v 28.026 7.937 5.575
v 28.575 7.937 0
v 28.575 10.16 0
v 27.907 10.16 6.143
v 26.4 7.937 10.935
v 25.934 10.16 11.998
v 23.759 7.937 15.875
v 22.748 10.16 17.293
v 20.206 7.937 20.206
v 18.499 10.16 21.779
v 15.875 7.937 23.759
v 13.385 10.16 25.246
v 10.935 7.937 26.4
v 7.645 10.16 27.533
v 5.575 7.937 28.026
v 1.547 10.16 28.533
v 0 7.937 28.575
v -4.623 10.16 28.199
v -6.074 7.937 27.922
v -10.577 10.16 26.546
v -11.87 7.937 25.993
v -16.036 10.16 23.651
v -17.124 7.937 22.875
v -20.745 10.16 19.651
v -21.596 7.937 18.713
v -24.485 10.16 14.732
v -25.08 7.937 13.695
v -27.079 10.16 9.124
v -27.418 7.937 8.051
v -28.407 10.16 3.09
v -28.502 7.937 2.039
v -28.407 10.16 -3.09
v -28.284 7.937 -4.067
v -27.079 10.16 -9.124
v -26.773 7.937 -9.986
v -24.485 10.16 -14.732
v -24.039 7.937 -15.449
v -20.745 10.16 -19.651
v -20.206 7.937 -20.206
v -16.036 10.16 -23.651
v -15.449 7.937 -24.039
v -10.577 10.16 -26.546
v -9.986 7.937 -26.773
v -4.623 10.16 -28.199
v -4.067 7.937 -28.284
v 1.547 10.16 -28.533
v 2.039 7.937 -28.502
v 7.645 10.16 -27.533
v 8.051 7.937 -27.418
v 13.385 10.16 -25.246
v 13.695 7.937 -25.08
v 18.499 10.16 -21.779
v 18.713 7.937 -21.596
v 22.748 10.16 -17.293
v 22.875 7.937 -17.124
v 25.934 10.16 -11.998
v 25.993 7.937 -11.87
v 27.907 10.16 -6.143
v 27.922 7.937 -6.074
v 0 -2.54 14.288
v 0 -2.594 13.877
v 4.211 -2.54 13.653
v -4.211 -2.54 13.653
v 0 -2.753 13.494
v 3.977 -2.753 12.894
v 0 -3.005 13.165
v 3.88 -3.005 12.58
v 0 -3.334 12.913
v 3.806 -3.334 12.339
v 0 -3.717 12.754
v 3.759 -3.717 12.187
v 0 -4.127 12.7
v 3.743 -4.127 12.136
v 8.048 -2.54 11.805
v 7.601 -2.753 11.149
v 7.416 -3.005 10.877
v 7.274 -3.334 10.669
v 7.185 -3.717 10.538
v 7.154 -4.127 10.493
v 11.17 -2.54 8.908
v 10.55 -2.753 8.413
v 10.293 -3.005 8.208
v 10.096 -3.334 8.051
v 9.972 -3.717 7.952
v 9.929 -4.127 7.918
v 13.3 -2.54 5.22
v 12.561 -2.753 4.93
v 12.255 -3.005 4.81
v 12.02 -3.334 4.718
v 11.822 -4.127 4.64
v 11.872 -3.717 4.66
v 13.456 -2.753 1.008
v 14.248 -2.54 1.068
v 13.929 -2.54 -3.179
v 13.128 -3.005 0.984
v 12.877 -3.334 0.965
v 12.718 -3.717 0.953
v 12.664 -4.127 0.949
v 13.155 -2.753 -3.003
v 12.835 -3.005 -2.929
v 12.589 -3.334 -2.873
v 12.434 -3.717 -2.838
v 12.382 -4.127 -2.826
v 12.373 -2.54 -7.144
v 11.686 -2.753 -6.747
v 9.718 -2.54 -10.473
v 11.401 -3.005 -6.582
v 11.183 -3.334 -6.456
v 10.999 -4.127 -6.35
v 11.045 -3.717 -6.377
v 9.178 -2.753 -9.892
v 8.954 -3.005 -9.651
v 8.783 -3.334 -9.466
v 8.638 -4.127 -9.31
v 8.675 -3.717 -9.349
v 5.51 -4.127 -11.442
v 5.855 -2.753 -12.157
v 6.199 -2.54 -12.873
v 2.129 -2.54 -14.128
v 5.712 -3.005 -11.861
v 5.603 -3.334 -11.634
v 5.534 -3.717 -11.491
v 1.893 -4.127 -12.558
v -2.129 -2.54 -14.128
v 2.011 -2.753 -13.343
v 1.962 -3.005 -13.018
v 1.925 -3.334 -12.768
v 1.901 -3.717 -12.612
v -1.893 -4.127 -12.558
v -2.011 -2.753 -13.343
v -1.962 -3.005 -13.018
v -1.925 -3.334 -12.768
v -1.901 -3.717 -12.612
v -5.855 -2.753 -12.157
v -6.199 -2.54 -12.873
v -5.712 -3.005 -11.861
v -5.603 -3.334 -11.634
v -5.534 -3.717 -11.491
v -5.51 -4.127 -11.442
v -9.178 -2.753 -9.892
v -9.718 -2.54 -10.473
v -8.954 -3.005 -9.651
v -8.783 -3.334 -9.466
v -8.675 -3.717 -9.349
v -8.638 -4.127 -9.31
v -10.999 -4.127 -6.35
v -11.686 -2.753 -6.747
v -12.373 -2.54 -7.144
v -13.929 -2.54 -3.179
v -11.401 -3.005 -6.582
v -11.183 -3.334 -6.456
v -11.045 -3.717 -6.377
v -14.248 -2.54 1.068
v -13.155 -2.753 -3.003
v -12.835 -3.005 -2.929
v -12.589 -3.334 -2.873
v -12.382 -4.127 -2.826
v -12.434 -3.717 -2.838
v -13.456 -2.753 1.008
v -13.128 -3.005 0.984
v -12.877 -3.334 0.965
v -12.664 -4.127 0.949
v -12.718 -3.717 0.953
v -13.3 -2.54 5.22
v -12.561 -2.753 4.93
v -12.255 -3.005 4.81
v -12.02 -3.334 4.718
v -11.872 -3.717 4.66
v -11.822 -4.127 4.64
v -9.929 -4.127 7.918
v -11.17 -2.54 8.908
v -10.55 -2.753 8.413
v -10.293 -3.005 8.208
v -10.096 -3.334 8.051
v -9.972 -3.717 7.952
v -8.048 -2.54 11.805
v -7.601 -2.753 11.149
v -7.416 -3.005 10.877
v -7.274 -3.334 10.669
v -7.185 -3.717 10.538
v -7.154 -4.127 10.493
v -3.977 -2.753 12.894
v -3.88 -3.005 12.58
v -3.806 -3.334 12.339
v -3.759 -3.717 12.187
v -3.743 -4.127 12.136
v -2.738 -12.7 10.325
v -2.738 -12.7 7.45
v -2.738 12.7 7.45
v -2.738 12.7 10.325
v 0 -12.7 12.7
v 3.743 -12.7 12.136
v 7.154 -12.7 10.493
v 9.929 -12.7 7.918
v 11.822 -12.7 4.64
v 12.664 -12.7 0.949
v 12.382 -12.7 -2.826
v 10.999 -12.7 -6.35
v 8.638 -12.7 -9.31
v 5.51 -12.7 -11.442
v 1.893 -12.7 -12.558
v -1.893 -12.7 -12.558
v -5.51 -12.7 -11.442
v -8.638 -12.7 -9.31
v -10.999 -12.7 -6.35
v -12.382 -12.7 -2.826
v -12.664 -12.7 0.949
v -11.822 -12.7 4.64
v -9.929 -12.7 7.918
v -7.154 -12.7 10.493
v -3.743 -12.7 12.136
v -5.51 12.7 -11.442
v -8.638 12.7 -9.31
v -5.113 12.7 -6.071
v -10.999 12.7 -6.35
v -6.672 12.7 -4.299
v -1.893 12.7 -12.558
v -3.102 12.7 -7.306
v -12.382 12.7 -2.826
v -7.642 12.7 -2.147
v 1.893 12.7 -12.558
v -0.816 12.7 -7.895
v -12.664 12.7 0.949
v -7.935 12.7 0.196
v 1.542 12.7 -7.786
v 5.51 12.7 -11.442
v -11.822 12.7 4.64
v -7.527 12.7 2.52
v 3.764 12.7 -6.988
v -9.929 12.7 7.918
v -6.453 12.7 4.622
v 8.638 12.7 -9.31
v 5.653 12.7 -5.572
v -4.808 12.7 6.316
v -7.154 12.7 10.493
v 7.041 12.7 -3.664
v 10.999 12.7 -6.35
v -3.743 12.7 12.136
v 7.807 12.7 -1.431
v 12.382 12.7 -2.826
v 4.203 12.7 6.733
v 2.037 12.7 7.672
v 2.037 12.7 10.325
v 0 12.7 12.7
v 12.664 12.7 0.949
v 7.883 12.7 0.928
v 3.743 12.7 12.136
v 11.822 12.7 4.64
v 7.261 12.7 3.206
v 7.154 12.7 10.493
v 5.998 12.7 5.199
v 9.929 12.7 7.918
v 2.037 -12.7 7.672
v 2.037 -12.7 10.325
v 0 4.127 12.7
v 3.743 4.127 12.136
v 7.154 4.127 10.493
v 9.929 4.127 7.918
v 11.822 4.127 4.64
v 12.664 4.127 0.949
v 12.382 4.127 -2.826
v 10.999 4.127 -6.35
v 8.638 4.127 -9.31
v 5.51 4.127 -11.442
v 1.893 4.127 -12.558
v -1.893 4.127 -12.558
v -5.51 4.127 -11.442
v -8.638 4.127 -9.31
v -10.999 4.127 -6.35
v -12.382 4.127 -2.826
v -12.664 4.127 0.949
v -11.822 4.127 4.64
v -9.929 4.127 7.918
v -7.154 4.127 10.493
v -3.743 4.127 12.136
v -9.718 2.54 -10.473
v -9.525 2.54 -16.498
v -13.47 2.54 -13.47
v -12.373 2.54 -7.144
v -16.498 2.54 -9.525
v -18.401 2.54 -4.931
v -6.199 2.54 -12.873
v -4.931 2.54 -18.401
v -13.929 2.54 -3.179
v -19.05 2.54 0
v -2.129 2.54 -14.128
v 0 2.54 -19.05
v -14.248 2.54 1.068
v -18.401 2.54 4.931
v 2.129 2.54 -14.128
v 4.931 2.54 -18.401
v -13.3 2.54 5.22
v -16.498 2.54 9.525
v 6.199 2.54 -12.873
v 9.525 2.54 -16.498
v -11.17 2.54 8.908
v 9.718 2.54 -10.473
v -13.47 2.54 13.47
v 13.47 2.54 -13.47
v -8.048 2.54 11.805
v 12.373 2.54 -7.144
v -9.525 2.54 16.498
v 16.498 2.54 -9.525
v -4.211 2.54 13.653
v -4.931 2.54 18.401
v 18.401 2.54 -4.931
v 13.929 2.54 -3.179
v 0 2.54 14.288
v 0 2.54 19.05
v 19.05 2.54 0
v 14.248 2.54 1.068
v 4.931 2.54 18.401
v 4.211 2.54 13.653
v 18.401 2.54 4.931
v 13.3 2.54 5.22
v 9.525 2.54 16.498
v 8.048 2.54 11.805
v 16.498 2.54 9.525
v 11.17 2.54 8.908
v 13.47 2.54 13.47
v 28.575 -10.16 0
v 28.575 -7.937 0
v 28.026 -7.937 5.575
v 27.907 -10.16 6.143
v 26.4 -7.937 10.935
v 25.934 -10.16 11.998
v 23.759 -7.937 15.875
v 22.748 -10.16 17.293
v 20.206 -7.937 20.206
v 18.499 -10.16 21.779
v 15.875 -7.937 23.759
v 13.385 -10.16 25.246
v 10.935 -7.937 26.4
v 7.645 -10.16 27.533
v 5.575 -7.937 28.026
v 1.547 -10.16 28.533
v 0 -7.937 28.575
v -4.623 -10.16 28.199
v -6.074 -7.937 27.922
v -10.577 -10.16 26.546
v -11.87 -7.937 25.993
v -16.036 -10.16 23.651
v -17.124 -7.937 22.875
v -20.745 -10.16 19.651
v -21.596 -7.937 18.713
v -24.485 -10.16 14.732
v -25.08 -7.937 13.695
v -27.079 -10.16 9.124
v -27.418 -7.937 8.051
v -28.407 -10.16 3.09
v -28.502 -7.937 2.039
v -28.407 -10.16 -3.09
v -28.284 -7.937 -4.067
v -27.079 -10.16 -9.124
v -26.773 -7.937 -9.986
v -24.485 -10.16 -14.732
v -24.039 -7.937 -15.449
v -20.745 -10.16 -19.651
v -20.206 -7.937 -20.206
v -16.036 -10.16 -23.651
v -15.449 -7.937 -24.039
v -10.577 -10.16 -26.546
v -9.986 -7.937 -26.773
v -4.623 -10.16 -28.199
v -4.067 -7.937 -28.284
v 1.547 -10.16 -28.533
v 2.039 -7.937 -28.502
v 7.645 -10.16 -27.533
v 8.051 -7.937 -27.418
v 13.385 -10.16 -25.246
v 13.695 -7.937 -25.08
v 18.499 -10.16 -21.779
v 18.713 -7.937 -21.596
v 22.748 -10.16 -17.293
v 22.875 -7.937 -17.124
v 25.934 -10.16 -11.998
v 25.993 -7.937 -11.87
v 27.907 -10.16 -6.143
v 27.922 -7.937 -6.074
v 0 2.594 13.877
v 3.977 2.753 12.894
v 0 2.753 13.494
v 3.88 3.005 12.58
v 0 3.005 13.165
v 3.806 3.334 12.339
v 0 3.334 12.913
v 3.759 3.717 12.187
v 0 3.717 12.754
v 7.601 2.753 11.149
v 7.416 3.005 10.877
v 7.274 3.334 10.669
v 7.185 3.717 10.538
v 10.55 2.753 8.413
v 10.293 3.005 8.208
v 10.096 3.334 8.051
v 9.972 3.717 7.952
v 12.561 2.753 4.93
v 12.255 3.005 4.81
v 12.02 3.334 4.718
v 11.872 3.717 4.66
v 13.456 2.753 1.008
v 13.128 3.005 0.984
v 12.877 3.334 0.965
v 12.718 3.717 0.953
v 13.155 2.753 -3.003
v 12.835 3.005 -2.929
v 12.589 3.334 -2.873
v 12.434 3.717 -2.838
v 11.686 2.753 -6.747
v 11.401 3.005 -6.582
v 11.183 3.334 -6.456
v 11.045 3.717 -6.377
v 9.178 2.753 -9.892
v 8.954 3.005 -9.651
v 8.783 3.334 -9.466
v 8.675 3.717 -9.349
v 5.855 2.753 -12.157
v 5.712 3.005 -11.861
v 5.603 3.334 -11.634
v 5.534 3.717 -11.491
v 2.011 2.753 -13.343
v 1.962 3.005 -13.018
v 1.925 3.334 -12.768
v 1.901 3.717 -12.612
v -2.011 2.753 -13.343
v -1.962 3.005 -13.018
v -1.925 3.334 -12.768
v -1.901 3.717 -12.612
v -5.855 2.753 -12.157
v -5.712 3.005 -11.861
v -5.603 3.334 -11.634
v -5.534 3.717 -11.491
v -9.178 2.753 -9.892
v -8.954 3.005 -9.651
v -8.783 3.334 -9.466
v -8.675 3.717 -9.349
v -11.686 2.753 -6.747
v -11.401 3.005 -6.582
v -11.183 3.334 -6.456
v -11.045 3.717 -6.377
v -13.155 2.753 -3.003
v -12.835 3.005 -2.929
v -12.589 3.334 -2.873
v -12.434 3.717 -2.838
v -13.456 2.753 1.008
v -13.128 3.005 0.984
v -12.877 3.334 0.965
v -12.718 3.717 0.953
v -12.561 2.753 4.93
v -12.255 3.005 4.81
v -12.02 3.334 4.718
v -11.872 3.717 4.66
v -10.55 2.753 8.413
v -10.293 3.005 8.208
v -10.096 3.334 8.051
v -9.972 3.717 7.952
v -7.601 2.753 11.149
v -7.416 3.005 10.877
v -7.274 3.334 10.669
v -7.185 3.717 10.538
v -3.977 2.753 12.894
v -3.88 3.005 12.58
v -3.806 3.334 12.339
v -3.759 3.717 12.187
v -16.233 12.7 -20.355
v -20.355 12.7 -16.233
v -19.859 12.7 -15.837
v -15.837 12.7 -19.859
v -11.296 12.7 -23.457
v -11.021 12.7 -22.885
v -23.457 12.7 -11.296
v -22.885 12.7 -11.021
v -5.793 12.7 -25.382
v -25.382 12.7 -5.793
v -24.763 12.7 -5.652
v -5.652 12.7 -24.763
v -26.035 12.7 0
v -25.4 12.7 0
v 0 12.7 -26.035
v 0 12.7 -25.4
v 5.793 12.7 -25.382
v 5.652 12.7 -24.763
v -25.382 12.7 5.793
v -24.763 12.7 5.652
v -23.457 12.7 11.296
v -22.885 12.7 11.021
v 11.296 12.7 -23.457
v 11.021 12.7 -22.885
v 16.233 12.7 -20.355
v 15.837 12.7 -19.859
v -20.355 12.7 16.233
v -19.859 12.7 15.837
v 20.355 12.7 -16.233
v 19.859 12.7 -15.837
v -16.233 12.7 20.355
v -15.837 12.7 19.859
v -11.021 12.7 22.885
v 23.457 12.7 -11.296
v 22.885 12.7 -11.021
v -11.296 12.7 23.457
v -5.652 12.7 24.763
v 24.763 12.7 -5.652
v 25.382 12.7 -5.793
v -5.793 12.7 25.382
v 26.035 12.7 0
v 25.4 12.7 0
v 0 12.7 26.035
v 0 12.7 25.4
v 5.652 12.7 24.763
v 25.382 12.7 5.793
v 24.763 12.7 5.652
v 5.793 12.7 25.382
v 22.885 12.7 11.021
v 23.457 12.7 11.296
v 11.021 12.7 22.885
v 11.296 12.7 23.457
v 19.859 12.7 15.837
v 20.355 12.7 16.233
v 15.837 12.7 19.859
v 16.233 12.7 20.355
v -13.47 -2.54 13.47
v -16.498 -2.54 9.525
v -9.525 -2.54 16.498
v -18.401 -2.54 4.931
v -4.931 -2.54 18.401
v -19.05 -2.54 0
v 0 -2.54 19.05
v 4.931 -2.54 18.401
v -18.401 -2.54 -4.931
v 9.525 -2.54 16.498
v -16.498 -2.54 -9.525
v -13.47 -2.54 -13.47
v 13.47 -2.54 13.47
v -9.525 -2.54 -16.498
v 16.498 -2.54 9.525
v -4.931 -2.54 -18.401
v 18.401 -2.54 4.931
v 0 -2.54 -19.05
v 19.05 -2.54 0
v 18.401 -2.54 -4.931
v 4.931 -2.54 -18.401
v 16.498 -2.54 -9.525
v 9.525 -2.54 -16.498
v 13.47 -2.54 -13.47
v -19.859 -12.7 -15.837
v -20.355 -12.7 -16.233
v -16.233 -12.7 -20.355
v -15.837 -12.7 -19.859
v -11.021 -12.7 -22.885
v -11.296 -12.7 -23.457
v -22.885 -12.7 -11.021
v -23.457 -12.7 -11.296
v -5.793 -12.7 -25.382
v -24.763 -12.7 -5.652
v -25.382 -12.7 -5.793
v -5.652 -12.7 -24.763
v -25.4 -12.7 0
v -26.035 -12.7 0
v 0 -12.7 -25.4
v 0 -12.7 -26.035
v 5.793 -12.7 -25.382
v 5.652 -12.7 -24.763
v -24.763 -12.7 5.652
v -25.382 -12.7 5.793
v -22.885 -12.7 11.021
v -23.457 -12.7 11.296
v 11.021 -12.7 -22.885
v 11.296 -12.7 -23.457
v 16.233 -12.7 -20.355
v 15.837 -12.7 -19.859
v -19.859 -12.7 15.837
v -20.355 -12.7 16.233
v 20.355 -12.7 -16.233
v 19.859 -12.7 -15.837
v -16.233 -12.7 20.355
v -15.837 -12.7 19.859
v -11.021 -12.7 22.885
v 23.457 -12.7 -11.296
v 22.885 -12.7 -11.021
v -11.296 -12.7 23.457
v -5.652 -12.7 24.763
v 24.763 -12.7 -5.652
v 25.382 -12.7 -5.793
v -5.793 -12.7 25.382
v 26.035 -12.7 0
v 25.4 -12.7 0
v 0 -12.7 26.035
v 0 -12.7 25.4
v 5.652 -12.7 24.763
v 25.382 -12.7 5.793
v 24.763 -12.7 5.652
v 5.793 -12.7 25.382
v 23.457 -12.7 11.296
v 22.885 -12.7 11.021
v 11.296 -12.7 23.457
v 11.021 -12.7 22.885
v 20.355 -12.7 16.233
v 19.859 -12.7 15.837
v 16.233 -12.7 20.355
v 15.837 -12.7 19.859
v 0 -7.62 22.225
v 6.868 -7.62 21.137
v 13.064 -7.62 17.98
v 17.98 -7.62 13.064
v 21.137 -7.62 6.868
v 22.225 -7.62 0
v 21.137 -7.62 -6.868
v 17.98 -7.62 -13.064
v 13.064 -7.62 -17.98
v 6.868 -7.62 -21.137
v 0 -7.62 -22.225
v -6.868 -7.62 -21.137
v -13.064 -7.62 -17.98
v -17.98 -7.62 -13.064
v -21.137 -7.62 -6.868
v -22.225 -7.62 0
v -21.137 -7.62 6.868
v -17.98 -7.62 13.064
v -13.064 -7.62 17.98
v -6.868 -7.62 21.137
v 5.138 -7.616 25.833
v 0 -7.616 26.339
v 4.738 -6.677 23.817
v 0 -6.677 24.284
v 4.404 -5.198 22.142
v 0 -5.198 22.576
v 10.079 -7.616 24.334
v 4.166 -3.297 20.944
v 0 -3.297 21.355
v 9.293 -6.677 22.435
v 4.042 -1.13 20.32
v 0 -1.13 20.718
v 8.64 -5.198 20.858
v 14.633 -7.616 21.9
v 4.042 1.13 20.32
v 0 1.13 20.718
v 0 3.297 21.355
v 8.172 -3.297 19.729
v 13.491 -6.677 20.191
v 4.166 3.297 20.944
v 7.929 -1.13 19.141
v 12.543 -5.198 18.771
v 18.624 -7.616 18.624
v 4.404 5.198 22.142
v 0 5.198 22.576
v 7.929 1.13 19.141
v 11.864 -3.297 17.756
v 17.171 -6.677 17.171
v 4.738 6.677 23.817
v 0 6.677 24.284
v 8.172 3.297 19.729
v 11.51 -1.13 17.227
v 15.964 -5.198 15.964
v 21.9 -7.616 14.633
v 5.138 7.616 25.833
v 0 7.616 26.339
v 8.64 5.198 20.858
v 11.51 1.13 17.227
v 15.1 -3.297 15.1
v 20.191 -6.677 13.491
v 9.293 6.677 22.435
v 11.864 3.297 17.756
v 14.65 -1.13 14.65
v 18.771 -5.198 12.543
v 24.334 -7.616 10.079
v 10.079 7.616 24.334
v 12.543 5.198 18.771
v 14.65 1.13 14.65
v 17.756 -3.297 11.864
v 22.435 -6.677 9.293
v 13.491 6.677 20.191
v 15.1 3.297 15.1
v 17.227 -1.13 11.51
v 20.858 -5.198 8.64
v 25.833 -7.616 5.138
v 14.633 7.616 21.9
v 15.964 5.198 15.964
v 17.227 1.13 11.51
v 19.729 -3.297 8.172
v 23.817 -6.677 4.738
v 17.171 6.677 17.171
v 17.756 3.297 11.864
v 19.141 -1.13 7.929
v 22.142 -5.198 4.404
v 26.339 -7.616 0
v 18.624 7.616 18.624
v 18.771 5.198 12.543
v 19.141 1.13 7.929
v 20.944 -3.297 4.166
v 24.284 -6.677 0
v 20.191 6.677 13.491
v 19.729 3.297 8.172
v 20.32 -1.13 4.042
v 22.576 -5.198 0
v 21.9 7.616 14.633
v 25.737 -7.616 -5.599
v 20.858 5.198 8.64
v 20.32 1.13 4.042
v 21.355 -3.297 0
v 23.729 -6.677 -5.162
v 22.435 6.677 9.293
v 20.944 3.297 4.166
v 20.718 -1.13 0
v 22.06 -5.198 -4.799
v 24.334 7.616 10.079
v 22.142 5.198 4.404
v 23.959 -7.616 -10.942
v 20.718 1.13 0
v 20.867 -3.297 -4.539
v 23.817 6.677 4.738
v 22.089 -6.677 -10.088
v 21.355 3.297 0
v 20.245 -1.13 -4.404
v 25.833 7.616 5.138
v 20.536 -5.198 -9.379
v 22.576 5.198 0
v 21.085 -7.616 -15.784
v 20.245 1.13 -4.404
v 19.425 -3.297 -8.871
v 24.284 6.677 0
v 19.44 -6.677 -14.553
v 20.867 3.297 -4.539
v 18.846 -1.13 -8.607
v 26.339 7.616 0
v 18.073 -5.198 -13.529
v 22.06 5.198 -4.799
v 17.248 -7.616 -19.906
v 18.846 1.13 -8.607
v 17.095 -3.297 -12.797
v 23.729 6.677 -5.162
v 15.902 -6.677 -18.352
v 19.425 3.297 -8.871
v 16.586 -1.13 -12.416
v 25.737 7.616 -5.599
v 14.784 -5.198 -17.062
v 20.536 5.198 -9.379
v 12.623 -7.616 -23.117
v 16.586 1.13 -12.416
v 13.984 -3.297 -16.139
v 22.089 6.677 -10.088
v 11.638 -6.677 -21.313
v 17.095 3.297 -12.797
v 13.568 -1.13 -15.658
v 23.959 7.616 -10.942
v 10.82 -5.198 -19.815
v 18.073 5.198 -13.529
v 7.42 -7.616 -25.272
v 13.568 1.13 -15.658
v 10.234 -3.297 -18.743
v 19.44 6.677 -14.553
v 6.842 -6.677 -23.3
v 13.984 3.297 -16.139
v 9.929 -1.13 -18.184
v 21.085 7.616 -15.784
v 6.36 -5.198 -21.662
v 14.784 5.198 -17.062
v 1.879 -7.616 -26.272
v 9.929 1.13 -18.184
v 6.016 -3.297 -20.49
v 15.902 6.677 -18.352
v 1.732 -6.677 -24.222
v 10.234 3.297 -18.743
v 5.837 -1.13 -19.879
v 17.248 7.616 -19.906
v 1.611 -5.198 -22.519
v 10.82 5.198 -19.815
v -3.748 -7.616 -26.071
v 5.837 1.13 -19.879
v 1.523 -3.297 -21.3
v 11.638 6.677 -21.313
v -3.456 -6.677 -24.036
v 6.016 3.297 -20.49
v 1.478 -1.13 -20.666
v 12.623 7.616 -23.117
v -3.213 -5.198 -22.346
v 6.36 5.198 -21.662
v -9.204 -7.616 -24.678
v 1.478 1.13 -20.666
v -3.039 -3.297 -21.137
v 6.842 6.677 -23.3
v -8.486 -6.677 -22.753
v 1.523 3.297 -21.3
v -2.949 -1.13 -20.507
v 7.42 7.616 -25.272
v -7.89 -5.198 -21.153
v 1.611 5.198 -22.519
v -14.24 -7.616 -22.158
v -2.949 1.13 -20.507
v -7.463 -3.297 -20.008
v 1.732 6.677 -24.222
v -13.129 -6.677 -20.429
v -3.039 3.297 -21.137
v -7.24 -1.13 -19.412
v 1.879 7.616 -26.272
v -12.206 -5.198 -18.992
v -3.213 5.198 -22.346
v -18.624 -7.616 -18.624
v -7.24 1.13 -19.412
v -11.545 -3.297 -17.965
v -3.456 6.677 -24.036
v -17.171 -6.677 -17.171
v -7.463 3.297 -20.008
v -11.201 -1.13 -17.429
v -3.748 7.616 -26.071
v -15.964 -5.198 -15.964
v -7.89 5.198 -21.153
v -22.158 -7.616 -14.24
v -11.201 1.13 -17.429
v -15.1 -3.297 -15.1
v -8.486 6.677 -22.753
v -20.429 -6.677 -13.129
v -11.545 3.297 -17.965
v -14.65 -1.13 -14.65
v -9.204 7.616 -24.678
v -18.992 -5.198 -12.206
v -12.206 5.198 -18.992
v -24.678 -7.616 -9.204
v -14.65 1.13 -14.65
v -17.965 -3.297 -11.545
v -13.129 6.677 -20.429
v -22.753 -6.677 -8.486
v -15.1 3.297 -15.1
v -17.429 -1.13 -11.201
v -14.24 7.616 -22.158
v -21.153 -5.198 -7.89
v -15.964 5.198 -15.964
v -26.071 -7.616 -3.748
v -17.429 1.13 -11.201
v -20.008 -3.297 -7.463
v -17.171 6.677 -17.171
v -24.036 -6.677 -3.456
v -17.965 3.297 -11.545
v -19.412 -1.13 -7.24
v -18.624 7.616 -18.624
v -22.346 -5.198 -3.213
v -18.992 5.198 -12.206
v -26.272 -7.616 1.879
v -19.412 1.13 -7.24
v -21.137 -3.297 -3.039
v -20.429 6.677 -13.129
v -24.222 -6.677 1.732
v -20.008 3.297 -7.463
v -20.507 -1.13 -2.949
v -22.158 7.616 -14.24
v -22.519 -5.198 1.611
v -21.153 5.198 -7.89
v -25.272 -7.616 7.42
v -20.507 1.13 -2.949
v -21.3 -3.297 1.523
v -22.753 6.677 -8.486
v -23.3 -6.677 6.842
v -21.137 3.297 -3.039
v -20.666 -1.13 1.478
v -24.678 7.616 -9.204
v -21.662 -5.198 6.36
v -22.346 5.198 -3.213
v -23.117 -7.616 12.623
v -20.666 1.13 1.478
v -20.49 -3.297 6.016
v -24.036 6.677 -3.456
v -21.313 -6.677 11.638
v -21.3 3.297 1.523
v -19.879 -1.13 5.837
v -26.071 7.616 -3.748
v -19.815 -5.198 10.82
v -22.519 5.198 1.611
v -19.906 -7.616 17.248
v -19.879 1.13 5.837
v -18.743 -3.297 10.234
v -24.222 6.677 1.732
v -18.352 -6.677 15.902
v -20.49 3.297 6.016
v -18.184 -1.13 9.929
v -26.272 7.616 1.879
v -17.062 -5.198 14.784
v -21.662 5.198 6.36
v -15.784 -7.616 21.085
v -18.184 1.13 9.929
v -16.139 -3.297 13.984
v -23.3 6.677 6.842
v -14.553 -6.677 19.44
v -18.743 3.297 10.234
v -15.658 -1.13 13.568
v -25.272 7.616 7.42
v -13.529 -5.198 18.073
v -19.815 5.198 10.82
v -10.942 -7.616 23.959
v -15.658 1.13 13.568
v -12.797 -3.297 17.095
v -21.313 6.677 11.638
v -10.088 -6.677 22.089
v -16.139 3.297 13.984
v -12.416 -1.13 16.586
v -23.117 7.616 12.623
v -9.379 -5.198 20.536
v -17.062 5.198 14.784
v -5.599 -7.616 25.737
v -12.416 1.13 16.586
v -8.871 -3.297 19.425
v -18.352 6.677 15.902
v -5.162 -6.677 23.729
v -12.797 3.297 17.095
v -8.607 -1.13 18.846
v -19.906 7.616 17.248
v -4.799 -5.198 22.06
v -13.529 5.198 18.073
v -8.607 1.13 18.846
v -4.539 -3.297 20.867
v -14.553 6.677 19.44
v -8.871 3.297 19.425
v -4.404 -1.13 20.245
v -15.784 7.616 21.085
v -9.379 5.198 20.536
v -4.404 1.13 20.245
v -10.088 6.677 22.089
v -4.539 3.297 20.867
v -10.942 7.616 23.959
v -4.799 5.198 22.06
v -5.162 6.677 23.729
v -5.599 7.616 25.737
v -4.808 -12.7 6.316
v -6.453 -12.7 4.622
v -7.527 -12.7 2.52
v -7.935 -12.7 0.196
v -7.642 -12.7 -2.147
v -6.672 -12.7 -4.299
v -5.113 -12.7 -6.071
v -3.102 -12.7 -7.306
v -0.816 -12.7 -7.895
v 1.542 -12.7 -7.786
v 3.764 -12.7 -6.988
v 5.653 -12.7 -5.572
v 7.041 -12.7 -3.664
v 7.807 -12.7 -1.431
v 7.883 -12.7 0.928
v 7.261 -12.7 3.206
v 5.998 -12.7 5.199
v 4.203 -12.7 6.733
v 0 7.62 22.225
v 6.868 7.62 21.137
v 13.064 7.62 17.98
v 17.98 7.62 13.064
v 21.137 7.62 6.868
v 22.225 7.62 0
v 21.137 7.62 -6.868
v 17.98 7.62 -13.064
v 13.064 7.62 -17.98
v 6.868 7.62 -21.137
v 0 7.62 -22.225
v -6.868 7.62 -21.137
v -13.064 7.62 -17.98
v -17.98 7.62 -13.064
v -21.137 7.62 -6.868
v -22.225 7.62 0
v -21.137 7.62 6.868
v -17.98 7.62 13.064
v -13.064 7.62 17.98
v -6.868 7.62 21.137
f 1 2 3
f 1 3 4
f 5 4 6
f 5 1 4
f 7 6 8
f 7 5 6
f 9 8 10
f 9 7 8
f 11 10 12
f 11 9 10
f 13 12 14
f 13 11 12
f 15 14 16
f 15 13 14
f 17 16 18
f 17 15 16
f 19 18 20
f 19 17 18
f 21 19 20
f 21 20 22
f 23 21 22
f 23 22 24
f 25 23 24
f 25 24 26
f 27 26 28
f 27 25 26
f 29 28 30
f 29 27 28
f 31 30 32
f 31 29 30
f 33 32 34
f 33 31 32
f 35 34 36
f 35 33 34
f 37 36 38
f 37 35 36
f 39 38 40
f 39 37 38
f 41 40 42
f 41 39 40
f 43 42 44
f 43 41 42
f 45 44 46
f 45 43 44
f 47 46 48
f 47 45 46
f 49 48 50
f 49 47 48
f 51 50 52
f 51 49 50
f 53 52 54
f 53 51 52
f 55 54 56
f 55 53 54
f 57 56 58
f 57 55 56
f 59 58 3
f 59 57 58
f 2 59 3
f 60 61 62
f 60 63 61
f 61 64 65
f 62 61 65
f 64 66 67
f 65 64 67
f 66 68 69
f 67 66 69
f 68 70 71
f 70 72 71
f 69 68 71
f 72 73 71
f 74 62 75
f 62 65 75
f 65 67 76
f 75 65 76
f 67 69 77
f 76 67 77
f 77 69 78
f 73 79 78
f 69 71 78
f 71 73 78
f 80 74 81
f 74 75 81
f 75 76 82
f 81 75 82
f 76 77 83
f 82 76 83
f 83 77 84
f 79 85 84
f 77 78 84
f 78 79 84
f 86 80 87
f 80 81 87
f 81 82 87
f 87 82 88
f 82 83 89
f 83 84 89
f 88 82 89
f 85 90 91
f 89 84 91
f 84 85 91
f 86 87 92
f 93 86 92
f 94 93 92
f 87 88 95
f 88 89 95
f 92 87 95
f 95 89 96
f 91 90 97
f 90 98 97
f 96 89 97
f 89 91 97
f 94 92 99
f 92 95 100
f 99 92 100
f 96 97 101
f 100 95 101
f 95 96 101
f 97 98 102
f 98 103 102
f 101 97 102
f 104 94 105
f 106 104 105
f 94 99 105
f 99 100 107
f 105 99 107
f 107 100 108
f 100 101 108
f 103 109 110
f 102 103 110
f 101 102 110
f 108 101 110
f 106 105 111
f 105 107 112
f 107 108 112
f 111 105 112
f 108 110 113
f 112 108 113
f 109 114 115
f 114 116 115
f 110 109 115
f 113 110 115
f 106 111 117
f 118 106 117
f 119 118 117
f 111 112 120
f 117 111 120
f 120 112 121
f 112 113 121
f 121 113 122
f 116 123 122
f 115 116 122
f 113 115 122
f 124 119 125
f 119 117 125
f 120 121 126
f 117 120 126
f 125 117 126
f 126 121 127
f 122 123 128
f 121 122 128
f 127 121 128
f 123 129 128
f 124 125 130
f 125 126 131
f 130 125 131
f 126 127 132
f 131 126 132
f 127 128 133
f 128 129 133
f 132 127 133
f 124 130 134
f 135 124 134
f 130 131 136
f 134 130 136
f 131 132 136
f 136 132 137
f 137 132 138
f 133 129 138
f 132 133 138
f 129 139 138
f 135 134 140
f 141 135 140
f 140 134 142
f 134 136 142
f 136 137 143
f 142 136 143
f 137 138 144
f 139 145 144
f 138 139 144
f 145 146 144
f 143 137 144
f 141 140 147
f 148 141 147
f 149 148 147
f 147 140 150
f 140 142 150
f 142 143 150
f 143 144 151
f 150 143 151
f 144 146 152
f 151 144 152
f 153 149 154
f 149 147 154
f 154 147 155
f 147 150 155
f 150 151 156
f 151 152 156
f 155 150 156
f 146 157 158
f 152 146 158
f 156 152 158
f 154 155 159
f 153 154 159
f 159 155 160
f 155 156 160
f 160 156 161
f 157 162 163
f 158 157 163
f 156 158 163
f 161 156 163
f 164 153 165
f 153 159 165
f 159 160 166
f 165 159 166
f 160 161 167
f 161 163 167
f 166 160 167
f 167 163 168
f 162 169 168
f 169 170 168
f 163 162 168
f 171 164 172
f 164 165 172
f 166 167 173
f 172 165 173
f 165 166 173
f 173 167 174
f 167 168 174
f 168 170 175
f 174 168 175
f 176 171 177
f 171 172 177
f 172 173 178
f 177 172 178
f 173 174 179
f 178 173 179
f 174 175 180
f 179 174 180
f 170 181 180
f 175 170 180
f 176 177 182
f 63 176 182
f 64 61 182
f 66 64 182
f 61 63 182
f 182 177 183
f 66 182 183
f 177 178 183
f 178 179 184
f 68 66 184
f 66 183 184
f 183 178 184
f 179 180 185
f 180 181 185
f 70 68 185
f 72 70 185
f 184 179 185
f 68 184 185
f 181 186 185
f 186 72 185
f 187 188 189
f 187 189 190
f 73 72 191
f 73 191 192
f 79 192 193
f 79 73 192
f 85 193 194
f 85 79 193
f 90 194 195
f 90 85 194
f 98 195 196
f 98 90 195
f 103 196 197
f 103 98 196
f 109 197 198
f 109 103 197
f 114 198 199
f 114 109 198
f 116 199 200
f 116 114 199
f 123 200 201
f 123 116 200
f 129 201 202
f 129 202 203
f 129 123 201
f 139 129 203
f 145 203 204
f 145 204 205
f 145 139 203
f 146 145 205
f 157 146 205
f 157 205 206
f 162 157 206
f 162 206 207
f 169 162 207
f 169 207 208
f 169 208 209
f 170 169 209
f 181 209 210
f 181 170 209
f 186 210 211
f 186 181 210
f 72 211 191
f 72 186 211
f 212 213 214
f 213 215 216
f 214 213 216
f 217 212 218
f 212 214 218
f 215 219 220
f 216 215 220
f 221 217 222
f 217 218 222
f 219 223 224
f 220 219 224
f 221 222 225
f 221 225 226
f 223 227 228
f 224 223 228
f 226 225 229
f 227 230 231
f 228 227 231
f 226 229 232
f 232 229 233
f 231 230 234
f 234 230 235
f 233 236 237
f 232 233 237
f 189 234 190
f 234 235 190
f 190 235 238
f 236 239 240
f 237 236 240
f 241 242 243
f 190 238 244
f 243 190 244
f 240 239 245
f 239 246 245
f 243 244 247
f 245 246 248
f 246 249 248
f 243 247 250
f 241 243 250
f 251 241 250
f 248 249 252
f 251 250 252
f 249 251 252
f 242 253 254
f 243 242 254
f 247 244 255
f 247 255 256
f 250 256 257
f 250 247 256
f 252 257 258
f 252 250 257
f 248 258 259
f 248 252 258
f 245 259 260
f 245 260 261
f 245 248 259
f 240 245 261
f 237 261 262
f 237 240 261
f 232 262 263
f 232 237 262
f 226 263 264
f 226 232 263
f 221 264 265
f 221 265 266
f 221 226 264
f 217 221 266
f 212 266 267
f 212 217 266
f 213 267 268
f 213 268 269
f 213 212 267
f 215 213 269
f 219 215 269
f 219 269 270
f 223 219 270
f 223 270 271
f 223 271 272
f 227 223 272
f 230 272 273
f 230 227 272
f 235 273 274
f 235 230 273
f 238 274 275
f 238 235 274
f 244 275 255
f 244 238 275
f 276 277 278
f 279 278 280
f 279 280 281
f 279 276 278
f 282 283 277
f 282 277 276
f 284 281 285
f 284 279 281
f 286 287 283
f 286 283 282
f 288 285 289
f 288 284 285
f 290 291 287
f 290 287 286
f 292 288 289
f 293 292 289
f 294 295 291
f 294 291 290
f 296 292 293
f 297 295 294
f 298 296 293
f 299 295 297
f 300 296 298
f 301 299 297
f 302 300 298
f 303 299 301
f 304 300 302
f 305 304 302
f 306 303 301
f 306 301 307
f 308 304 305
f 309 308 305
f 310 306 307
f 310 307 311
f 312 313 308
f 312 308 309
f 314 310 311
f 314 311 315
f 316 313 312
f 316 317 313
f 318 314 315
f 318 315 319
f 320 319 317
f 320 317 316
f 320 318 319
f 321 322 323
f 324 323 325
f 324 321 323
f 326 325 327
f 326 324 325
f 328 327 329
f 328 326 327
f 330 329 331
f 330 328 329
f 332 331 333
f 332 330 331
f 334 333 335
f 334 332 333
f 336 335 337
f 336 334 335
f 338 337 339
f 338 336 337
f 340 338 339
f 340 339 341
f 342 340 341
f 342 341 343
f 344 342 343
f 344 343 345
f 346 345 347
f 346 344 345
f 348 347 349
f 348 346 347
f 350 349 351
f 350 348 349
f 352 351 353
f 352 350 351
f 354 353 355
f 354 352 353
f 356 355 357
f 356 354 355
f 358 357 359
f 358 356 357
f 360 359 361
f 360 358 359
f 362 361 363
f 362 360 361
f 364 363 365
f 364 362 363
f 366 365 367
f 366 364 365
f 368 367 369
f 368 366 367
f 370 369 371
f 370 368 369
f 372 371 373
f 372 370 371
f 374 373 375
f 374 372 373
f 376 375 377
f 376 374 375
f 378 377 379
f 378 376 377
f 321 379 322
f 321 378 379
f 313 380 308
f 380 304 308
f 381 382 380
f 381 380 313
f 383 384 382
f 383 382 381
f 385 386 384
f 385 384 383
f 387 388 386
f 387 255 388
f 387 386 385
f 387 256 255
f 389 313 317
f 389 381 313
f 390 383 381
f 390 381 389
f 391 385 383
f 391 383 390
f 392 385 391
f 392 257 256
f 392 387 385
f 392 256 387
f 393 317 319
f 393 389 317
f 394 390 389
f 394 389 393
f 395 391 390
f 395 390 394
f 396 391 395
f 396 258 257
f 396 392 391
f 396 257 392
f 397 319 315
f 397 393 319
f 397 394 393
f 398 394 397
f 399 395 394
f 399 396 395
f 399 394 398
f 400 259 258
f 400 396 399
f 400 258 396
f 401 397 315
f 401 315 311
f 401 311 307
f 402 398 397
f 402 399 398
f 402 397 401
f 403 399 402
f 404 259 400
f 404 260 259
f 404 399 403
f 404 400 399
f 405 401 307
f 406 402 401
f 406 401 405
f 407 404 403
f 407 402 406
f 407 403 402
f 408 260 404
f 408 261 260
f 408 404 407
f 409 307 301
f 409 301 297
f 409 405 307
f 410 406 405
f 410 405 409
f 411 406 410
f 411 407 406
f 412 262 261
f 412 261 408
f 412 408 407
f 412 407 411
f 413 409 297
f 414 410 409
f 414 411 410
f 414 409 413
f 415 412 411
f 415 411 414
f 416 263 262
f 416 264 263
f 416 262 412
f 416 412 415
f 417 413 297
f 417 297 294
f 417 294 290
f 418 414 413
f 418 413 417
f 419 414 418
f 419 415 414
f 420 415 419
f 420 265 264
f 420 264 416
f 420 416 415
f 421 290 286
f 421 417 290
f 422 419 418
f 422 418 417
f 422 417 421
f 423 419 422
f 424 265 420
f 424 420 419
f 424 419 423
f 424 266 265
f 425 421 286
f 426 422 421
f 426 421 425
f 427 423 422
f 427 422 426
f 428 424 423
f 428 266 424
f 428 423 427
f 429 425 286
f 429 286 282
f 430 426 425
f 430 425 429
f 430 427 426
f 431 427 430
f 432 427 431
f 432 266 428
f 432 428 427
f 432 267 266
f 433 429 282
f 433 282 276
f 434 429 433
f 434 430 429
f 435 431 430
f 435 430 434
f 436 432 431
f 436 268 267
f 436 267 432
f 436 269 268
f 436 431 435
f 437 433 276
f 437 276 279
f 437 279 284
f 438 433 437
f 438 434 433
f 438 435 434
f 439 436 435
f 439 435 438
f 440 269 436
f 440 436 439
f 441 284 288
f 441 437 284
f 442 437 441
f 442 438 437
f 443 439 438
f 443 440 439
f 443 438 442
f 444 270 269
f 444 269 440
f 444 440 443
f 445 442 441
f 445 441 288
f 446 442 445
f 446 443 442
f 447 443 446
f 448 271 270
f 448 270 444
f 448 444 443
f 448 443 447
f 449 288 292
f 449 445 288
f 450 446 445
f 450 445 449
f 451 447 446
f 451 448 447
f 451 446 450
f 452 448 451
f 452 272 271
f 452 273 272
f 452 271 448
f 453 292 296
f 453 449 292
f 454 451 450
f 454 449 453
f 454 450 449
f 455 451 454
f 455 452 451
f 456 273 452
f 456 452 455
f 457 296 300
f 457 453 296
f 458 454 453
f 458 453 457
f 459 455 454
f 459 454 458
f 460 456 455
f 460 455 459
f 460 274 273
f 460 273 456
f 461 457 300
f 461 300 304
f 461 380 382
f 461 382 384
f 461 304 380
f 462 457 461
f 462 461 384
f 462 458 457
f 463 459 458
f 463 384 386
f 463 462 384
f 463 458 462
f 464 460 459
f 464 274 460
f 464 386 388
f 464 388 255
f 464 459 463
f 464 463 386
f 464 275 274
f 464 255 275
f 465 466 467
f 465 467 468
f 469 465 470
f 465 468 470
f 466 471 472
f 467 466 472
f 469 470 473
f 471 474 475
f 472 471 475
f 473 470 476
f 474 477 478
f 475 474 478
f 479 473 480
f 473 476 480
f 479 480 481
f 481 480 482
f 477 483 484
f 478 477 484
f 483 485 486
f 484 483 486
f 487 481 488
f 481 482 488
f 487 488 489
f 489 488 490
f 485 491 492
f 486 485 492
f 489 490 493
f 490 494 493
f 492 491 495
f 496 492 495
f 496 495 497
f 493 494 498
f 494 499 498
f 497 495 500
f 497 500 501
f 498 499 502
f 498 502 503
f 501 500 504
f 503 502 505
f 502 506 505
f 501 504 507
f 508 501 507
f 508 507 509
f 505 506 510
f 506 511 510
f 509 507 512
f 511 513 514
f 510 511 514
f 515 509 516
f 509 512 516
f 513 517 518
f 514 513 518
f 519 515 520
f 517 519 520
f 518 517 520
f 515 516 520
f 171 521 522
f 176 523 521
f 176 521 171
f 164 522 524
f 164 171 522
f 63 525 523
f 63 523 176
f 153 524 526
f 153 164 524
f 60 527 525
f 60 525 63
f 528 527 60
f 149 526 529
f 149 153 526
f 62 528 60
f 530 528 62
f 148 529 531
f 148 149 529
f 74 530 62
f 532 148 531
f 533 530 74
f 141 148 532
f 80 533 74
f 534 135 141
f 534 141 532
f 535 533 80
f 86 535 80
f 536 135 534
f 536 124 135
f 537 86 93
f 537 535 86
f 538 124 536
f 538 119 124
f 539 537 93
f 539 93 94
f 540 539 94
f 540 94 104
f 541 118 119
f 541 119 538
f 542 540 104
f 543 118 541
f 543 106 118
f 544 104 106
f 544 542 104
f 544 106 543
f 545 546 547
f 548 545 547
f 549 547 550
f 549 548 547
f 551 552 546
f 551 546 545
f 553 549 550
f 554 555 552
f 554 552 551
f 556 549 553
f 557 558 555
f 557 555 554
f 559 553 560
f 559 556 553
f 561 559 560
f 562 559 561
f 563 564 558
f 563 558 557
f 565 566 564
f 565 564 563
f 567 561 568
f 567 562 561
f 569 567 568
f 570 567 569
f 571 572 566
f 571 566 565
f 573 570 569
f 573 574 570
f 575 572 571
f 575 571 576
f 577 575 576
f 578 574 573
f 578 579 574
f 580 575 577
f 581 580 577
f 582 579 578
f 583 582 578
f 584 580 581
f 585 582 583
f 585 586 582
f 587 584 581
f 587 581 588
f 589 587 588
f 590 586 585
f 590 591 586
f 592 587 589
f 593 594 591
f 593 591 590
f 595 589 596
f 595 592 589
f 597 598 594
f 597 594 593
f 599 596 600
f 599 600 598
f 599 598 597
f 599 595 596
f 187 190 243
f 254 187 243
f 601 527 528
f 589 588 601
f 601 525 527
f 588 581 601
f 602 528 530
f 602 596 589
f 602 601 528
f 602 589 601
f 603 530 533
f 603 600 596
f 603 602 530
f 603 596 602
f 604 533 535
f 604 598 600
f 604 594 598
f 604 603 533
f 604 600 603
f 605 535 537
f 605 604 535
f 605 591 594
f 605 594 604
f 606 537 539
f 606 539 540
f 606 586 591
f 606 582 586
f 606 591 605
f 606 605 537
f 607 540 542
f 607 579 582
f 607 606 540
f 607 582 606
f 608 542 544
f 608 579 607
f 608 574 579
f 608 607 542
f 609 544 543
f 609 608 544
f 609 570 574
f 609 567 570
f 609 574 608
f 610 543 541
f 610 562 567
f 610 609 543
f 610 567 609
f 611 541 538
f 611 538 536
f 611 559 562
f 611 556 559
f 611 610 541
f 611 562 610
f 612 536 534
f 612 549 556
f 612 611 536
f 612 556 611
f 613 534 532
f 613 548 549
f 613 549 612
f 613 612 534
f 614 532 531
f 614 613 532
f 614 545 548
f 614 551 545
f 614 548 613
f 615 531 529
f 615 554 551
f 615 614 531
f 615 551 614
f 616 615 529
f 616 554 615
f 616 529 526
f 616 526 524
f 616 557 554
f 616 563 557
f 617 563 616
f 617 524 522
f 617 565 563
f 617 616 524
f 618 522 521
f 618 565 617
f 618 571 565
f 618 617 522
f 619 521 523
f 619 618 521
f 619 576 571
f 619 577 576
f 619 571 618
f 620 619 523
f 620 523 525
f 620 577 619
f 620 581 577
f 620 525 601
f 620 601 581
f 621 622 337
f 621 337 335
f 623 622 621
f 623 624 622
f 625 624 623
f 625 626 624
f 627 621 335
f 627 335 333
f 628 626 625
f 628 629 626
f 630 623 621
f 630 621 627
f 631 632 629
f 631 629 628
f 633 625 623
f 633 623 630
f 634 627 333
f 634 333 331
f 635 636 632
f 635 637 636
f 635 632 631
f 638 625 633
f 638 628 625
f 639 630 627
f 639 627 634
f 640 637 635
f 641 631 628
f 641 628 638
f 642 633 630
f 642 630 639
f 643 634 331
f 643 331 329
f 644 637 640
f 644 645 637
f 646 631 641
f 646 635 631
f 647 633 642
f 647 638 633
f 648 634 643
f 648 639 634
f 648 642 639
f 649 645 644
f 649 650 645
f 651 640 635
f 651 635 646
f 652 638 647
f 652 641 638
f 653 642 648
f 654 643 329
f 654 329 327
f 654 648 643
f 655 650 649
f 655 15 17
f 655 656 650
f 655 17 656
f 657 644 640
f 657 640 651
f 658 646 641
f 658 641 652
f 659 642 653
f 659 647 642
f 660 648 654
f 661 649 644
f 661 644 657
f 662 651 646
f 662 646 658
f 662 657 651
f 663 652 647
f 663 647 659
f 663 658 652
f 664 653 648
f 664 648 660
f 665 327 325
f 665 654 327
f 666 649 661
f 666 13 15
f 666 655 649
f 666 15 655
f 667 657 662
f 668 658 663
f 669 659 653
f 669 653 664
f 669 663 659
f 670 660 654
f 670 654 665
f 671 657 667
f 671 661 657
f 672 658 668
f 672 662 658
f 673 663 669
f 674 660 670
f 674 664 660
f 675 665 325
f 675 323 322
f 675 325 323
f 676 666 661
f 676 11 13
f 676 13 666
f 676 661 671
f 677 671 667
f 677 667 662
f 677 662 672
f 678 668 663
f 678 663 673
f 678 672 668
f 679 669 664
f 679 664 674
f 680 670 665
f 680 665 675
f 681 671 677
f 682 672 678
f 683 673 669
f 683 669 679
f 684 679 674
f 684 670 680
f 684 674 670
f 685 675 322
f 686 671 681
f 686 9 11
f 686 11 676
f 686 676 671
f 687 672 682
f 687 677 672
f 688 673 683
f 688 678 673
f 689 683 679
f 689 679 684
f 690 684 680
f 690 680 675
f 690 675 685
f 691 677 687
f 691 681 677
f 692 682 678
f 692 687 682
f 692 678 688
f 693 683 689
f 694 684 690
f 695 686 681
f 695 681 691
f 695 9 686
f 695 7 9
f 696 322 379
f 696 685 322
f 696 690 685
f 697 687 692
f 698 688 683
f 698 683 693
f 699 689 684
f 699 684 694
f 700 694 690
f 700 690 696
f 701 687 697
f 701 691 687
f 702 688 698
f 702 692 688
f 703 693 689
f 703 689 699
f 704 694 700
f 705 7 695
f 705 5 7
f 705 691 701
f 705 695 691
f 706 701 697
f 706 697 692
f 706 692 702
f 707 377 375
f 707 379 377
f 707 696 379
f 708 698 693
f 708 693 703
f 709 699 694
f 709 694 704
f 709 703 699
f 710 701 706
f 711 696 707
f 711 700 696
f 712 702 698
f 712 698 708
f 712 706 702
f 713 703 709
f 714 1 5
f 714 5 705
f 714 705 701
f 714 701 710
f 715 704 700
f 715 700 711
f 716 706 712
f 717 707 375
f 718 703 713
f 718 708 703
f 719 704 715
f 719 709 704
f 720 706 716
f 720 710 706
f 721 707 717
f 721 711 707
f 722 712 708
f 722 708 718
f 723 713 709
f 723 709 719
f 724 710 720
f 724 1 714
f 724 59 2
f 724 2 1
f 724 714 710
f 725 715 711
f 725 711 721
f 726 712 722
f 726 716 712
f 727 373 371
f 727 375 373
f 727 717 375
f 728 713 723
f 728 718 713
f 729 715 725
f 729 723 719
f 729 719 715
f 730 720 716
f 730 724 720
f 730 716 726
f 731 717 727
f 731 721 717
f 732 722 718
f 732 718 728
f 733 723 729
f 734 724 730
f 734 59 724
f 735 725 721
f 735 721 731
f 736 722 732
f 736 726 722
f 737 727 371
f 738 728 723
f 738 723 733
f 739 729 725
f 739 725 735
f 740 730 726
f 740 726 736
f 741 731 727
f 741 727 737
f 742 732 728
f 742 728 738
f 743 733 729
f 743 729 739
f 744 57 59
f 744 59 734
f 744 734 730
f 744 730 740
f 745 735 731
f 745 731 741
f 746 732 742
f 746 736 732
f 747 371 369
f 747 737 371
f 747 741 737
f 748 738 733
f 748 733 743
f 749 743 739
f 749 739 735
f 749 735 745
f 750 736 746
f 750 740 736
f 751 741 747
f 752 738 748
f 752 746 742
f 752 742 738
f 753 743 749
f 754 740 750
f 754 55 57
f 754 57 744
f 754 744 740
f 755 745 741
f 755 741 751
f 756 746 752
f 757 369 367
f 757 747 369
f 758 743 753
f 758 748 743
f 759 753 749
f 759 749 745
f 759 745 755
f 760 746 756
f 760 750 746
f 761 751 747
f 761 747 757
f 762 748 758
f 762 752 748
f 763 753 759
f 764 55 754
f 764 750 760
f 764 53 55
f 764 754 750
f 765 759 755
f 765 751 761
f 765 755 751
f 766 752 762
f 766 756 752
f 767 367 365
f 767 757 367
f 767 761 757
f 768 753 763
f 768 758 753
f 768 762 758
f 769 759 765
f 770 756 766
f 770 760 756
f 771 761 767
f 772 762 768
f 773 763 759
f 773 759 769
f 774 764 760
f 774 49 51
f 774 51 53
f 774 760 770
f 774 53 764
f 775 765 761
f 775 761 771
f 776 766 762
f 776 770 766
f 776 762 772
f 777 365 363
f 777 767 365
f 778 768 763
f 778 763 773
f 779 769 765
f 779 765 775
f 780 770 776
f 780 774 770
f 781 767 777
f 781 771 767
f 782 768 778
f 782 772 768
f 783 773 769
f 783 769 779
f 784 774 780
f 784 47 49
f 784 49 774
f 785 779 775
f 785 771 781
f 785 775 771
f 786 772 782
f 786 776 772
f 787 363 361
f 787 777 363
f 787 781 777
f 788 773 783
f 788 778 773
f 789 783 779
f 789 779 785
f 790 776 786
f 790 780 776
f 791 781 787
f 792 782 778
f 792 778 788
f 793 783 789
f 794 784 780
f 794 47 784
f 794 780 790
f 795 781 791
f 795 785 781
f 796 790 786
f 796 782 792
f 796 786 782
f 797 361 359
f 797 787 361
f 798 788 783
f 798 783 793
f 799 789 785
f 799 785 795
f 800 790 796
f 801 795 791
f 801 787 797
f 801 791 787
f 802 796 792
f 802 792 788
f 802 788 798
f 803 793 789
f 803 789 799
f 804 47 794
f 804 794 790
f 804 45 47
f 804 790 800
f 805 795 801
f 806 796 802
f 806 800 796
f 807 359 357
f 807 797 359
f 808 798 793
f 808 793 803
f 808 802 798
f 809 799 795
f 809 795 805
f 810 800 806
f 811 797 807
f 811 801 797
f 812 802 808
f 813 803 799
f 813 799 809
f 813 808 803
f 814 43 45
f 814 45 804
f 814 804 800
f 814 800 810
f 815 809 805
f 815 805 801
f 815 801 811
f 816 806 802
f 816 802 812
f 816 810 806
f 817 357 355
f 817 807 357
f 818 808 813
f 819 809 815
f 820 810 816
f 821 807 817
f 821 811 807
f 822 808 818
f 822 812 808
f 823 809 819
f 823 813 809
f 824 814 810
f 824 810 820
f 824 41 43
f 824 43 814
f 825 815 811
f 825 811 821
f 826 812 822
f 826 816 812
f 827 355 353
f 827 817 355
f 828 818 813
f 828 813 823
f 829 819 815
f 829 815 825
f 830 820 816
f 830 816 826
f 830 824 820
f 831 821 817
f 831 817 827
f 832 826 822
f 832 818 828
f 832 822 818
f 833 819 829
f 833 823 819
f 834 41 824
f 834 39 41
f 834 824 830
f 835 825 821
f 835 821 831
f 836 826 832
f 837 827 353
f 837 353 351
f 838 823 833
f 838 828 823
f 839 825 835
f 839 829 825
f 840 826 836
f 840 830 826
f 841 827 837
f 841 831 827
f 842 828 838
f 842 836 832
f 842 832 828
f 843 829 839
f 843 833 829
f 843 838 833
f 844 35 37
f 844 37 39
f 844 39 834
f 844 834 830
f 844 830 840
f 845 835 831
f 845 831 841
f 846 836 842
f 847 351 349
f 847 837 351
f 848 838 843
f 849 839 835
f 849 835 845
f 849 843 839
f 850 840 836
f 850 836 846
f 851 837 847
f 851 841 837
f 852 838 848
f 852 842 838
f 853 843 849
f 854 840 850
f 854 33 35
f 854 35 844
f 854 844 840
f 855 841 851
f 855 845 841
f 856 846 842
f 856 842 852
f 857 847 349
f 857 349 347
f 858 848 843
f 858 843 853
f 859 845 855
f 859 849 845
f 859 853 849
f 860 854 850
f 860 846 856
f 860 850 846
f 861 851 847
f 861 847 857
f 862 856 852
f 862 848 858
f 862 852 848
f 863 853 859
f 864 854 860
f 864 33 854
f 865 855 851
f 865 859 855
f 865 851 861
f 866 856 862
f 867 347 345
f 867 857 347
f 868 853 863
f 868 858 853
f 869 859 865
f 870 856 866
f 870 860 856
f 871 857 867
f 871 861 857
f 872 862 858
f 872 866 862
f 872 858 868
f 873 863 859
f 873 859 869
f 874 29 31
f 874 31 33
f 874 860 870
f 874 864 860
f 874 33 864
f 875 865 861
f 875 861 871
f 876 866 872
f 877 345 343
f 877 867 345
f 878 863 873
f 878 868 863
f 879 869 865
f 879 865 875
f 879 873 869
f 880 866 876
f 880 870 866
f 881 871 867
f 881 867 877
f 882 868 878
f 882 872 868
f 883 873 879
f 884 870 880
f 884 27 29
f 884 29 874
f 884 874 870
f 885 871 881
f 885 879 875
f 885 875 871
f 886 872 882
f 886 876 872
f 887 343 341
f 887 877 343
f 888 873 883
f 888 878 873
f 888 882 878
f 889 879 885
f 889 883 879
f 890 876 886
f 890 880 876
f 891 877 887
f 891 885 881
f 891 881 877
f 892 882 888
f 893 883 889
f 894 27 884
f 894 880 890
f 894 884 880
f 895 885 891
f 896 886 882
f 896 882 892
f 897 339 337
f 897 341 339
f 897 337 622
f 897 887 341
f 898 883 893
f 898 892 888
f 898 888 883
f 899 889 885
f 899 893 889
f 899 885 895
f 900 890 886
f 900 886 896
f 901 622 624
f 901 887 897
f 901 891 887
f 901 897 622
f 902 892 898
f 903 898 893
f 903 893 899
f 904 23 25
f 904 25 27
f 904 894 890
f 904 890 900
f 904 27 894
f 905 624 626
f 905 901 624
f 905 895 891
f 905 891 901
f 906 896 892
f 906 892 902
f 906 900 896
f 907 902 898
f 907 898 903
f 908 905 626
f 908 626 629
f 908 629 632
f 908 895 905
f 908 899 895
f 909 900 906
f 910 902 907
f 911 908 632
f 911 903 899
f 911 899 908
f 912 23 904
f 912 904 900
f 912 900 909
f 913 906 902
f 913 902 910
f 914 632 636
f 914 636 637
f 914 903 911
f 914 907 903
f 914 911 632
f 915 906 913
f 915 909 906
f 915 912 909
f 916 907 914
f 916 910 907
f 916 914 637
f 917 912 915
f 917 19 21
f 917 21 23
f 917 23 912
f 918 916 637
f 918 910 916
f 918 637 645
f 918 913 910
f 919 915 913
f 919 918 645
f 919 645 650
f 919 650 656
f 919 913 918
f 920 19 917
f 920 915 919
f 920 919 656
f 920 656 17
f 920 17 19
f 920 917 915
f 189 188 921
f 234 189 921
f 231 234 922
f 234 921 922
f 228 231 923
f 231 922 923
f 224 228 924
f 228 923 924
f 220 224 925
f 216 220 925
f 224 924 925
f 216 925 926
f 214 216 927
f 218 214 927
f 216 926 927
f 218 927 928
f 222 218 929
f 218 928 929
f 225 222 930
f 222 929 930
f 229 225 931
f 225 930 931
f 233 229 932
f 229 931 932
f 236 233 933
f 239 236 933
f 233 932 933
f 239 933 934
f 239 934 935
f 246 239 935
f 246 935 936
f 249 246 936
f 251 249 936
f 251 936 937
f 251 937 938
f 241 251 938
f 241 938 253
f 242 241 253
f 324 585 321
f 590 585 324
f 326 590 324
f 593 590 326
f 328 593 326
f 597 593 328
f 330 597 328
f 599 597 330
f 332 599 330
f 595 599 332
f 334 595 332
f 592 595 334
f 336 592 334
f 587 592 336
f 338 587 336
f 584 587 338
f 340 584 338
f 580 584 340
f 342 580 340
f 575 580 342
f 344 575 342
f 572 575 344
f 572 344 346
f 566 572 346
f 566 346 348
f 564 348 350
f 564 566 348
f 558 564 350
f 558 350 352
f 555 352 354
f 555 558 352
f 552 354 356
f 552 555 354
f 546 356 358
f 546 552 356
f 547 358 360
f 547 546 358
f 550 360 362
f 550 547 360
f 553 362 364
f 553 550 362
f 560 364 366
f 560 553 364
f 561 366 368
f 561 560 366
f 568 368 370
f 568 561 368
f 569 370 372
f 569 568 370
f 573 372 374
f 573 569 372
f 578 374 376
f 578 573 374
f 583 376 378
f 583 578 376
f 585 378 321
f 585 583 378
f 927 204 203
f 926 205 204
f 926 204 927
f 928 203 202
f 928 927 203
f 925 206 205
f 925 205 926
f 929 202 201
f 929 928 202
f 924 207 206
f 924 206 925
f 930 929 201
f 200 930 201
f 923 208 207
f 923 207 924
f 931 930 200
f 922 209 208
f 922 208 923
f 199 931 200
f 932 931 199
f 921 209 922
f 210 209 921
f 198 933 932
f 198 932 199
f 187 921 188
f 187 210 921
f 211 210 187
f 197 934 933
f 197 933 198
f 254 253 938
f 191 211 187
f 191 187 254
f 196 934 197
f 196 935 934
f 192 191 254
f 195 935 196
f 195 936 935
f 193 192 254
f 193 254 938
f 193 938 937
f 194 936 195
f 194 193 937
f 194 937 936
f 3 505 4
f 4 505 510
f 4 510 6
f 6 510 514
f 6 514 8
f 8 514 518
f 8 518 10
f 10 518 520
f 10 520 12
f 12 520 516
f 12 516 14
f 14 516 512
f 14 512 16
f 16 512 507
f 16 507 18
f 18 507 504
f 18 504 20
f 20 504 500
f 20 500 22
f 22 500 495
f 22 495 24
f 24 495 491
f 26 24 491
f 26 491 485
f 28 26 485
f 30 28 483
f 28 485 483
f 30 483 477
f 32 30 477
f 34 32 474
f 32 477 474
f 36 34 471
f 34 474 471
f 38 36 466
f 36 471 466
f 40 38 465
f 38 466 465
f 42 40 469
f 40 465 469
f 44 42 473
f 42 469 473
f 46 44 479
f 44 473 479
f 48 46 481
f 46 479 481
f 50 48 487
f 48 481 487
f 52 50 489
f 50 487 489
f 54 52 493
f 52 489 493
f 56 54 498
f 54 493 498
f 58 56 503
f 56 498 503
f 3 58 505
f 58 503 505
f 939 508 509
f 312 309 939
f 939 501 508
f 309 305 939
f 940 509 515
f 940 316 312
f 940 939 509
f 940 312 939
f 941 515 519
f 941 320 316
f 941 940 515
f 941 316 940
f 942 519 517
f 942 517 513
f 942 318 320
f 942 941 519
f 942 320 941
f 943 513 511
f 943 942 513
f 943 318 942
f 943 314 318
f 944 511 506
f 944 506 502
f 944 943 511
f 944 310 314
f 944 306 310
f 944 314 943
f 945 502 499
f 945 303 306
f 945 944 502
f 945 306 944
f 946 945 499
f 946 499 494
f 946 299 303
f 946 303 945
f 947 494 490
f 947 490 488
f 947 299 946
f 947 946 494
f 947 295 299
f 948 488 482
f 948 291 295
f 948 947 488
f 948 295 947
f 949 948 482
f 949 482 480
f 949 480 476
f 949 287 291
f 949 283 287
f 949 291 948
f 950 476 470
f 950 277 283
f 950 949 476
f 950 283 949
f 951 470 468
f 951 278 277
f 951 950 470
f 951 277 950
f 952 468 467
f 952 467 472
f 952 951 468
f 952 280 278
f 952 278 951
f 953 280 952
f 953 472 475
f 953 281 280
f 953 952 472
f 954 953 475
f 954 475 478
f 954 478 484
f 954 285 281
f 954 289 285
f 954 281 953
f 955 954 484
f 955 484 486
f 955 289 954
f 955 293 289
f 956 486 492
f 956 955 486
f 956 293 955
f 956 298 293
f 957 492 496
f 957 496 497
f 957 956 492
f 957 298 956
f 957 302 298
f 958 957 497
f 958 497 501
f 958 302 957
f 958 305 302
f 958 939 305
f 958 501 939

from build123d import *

# Parameters (mm, degrees)
F0_R          = 28.575
F0_R_2        = 7.9375
F1_DEPTH      = 12.7
F1_DEPTH_BACK = 12.7
F2_R          = 7.9375
F6_SIZE2      = 2.54
F6_SIZE       = 2.54
F7_R          = 1.5875
F8_W          = 4.7752
F8_H          = 10.3251
F9_DEPTH      = 15.4178
F9_DEPTH_BACK = 13.716


with BuildPart() as f1:
    # F0 (on Front) → F1 (new body, two sides)
    with BuildSketch(Plane.XZ) as f1_sk:
        Circle(F0_R)
        Circle(F0_R_2, mode=Mode.SUBTRACT)
    extrude(amount=F1_DEPTH)
    extrude(f1_sk.sketch, amount=-F1_DEPTH_BACK)

    # F2 (on Right) → F3 (revolve, cut)
    with BuildSketch(Plane.YZ):
        with Locations((0, 28.575016)):
            Circle(F2_R)
    revolve(axis=Axis((0, 66.637202, 0), (0, 1, 0)), mode=Mode.SUBTRACT)

    # F4 (on Right) → F5 (revolve, cut)
    with BuildSketch(Plane.YZ):
        Polygon((2.54, 19.05), (2.54, 12.7), (12.7, 12.7), (12.7, 25.4), align=None)
        Polygon((-12.7, 12.7), (-2.54, 12.7), (-2.54, 19.05), (-12.7, 25.4), align=None)
    revolve(axis=Axis((0, 24.1046, 0), (0, 1, 0)), mode=Mode.SUBTRACT)

    # F6
    f6_edges = [f1.edges().sort_by_distance(p)[0] for p in [
        (-28.575, 12.7, 0),
        (-28.575, -12.7, 0),
    ]]
    chamfer(f6_edges, length=F6_SIZE, length2=F6_SIZE2)

    # F7
    f7_edges = [f1.edges().sort_by_distance(p)[0] for p in [
        (0, 2.54, -12.7),
        (0, -2.54, -12.7),
    ]]
    fillet(f7_edges, radius=F7_R)

    # F8 (on Front) → F9 (cut, two sides)
    with BuildSketch(Plane.XZ) as f9_sk:
        with Locations((-0.350346, 5.16255)):
            Rectangle(F8_W, F8_H)
    extrude(amount=F9_DEPTH, mode=Mode.SUBTRACT)
    extrude(f9_sk.sketch, amount=-F9_DEPTH_BACK, mode=Mode.SUBTRACT)


solid = f1.part
